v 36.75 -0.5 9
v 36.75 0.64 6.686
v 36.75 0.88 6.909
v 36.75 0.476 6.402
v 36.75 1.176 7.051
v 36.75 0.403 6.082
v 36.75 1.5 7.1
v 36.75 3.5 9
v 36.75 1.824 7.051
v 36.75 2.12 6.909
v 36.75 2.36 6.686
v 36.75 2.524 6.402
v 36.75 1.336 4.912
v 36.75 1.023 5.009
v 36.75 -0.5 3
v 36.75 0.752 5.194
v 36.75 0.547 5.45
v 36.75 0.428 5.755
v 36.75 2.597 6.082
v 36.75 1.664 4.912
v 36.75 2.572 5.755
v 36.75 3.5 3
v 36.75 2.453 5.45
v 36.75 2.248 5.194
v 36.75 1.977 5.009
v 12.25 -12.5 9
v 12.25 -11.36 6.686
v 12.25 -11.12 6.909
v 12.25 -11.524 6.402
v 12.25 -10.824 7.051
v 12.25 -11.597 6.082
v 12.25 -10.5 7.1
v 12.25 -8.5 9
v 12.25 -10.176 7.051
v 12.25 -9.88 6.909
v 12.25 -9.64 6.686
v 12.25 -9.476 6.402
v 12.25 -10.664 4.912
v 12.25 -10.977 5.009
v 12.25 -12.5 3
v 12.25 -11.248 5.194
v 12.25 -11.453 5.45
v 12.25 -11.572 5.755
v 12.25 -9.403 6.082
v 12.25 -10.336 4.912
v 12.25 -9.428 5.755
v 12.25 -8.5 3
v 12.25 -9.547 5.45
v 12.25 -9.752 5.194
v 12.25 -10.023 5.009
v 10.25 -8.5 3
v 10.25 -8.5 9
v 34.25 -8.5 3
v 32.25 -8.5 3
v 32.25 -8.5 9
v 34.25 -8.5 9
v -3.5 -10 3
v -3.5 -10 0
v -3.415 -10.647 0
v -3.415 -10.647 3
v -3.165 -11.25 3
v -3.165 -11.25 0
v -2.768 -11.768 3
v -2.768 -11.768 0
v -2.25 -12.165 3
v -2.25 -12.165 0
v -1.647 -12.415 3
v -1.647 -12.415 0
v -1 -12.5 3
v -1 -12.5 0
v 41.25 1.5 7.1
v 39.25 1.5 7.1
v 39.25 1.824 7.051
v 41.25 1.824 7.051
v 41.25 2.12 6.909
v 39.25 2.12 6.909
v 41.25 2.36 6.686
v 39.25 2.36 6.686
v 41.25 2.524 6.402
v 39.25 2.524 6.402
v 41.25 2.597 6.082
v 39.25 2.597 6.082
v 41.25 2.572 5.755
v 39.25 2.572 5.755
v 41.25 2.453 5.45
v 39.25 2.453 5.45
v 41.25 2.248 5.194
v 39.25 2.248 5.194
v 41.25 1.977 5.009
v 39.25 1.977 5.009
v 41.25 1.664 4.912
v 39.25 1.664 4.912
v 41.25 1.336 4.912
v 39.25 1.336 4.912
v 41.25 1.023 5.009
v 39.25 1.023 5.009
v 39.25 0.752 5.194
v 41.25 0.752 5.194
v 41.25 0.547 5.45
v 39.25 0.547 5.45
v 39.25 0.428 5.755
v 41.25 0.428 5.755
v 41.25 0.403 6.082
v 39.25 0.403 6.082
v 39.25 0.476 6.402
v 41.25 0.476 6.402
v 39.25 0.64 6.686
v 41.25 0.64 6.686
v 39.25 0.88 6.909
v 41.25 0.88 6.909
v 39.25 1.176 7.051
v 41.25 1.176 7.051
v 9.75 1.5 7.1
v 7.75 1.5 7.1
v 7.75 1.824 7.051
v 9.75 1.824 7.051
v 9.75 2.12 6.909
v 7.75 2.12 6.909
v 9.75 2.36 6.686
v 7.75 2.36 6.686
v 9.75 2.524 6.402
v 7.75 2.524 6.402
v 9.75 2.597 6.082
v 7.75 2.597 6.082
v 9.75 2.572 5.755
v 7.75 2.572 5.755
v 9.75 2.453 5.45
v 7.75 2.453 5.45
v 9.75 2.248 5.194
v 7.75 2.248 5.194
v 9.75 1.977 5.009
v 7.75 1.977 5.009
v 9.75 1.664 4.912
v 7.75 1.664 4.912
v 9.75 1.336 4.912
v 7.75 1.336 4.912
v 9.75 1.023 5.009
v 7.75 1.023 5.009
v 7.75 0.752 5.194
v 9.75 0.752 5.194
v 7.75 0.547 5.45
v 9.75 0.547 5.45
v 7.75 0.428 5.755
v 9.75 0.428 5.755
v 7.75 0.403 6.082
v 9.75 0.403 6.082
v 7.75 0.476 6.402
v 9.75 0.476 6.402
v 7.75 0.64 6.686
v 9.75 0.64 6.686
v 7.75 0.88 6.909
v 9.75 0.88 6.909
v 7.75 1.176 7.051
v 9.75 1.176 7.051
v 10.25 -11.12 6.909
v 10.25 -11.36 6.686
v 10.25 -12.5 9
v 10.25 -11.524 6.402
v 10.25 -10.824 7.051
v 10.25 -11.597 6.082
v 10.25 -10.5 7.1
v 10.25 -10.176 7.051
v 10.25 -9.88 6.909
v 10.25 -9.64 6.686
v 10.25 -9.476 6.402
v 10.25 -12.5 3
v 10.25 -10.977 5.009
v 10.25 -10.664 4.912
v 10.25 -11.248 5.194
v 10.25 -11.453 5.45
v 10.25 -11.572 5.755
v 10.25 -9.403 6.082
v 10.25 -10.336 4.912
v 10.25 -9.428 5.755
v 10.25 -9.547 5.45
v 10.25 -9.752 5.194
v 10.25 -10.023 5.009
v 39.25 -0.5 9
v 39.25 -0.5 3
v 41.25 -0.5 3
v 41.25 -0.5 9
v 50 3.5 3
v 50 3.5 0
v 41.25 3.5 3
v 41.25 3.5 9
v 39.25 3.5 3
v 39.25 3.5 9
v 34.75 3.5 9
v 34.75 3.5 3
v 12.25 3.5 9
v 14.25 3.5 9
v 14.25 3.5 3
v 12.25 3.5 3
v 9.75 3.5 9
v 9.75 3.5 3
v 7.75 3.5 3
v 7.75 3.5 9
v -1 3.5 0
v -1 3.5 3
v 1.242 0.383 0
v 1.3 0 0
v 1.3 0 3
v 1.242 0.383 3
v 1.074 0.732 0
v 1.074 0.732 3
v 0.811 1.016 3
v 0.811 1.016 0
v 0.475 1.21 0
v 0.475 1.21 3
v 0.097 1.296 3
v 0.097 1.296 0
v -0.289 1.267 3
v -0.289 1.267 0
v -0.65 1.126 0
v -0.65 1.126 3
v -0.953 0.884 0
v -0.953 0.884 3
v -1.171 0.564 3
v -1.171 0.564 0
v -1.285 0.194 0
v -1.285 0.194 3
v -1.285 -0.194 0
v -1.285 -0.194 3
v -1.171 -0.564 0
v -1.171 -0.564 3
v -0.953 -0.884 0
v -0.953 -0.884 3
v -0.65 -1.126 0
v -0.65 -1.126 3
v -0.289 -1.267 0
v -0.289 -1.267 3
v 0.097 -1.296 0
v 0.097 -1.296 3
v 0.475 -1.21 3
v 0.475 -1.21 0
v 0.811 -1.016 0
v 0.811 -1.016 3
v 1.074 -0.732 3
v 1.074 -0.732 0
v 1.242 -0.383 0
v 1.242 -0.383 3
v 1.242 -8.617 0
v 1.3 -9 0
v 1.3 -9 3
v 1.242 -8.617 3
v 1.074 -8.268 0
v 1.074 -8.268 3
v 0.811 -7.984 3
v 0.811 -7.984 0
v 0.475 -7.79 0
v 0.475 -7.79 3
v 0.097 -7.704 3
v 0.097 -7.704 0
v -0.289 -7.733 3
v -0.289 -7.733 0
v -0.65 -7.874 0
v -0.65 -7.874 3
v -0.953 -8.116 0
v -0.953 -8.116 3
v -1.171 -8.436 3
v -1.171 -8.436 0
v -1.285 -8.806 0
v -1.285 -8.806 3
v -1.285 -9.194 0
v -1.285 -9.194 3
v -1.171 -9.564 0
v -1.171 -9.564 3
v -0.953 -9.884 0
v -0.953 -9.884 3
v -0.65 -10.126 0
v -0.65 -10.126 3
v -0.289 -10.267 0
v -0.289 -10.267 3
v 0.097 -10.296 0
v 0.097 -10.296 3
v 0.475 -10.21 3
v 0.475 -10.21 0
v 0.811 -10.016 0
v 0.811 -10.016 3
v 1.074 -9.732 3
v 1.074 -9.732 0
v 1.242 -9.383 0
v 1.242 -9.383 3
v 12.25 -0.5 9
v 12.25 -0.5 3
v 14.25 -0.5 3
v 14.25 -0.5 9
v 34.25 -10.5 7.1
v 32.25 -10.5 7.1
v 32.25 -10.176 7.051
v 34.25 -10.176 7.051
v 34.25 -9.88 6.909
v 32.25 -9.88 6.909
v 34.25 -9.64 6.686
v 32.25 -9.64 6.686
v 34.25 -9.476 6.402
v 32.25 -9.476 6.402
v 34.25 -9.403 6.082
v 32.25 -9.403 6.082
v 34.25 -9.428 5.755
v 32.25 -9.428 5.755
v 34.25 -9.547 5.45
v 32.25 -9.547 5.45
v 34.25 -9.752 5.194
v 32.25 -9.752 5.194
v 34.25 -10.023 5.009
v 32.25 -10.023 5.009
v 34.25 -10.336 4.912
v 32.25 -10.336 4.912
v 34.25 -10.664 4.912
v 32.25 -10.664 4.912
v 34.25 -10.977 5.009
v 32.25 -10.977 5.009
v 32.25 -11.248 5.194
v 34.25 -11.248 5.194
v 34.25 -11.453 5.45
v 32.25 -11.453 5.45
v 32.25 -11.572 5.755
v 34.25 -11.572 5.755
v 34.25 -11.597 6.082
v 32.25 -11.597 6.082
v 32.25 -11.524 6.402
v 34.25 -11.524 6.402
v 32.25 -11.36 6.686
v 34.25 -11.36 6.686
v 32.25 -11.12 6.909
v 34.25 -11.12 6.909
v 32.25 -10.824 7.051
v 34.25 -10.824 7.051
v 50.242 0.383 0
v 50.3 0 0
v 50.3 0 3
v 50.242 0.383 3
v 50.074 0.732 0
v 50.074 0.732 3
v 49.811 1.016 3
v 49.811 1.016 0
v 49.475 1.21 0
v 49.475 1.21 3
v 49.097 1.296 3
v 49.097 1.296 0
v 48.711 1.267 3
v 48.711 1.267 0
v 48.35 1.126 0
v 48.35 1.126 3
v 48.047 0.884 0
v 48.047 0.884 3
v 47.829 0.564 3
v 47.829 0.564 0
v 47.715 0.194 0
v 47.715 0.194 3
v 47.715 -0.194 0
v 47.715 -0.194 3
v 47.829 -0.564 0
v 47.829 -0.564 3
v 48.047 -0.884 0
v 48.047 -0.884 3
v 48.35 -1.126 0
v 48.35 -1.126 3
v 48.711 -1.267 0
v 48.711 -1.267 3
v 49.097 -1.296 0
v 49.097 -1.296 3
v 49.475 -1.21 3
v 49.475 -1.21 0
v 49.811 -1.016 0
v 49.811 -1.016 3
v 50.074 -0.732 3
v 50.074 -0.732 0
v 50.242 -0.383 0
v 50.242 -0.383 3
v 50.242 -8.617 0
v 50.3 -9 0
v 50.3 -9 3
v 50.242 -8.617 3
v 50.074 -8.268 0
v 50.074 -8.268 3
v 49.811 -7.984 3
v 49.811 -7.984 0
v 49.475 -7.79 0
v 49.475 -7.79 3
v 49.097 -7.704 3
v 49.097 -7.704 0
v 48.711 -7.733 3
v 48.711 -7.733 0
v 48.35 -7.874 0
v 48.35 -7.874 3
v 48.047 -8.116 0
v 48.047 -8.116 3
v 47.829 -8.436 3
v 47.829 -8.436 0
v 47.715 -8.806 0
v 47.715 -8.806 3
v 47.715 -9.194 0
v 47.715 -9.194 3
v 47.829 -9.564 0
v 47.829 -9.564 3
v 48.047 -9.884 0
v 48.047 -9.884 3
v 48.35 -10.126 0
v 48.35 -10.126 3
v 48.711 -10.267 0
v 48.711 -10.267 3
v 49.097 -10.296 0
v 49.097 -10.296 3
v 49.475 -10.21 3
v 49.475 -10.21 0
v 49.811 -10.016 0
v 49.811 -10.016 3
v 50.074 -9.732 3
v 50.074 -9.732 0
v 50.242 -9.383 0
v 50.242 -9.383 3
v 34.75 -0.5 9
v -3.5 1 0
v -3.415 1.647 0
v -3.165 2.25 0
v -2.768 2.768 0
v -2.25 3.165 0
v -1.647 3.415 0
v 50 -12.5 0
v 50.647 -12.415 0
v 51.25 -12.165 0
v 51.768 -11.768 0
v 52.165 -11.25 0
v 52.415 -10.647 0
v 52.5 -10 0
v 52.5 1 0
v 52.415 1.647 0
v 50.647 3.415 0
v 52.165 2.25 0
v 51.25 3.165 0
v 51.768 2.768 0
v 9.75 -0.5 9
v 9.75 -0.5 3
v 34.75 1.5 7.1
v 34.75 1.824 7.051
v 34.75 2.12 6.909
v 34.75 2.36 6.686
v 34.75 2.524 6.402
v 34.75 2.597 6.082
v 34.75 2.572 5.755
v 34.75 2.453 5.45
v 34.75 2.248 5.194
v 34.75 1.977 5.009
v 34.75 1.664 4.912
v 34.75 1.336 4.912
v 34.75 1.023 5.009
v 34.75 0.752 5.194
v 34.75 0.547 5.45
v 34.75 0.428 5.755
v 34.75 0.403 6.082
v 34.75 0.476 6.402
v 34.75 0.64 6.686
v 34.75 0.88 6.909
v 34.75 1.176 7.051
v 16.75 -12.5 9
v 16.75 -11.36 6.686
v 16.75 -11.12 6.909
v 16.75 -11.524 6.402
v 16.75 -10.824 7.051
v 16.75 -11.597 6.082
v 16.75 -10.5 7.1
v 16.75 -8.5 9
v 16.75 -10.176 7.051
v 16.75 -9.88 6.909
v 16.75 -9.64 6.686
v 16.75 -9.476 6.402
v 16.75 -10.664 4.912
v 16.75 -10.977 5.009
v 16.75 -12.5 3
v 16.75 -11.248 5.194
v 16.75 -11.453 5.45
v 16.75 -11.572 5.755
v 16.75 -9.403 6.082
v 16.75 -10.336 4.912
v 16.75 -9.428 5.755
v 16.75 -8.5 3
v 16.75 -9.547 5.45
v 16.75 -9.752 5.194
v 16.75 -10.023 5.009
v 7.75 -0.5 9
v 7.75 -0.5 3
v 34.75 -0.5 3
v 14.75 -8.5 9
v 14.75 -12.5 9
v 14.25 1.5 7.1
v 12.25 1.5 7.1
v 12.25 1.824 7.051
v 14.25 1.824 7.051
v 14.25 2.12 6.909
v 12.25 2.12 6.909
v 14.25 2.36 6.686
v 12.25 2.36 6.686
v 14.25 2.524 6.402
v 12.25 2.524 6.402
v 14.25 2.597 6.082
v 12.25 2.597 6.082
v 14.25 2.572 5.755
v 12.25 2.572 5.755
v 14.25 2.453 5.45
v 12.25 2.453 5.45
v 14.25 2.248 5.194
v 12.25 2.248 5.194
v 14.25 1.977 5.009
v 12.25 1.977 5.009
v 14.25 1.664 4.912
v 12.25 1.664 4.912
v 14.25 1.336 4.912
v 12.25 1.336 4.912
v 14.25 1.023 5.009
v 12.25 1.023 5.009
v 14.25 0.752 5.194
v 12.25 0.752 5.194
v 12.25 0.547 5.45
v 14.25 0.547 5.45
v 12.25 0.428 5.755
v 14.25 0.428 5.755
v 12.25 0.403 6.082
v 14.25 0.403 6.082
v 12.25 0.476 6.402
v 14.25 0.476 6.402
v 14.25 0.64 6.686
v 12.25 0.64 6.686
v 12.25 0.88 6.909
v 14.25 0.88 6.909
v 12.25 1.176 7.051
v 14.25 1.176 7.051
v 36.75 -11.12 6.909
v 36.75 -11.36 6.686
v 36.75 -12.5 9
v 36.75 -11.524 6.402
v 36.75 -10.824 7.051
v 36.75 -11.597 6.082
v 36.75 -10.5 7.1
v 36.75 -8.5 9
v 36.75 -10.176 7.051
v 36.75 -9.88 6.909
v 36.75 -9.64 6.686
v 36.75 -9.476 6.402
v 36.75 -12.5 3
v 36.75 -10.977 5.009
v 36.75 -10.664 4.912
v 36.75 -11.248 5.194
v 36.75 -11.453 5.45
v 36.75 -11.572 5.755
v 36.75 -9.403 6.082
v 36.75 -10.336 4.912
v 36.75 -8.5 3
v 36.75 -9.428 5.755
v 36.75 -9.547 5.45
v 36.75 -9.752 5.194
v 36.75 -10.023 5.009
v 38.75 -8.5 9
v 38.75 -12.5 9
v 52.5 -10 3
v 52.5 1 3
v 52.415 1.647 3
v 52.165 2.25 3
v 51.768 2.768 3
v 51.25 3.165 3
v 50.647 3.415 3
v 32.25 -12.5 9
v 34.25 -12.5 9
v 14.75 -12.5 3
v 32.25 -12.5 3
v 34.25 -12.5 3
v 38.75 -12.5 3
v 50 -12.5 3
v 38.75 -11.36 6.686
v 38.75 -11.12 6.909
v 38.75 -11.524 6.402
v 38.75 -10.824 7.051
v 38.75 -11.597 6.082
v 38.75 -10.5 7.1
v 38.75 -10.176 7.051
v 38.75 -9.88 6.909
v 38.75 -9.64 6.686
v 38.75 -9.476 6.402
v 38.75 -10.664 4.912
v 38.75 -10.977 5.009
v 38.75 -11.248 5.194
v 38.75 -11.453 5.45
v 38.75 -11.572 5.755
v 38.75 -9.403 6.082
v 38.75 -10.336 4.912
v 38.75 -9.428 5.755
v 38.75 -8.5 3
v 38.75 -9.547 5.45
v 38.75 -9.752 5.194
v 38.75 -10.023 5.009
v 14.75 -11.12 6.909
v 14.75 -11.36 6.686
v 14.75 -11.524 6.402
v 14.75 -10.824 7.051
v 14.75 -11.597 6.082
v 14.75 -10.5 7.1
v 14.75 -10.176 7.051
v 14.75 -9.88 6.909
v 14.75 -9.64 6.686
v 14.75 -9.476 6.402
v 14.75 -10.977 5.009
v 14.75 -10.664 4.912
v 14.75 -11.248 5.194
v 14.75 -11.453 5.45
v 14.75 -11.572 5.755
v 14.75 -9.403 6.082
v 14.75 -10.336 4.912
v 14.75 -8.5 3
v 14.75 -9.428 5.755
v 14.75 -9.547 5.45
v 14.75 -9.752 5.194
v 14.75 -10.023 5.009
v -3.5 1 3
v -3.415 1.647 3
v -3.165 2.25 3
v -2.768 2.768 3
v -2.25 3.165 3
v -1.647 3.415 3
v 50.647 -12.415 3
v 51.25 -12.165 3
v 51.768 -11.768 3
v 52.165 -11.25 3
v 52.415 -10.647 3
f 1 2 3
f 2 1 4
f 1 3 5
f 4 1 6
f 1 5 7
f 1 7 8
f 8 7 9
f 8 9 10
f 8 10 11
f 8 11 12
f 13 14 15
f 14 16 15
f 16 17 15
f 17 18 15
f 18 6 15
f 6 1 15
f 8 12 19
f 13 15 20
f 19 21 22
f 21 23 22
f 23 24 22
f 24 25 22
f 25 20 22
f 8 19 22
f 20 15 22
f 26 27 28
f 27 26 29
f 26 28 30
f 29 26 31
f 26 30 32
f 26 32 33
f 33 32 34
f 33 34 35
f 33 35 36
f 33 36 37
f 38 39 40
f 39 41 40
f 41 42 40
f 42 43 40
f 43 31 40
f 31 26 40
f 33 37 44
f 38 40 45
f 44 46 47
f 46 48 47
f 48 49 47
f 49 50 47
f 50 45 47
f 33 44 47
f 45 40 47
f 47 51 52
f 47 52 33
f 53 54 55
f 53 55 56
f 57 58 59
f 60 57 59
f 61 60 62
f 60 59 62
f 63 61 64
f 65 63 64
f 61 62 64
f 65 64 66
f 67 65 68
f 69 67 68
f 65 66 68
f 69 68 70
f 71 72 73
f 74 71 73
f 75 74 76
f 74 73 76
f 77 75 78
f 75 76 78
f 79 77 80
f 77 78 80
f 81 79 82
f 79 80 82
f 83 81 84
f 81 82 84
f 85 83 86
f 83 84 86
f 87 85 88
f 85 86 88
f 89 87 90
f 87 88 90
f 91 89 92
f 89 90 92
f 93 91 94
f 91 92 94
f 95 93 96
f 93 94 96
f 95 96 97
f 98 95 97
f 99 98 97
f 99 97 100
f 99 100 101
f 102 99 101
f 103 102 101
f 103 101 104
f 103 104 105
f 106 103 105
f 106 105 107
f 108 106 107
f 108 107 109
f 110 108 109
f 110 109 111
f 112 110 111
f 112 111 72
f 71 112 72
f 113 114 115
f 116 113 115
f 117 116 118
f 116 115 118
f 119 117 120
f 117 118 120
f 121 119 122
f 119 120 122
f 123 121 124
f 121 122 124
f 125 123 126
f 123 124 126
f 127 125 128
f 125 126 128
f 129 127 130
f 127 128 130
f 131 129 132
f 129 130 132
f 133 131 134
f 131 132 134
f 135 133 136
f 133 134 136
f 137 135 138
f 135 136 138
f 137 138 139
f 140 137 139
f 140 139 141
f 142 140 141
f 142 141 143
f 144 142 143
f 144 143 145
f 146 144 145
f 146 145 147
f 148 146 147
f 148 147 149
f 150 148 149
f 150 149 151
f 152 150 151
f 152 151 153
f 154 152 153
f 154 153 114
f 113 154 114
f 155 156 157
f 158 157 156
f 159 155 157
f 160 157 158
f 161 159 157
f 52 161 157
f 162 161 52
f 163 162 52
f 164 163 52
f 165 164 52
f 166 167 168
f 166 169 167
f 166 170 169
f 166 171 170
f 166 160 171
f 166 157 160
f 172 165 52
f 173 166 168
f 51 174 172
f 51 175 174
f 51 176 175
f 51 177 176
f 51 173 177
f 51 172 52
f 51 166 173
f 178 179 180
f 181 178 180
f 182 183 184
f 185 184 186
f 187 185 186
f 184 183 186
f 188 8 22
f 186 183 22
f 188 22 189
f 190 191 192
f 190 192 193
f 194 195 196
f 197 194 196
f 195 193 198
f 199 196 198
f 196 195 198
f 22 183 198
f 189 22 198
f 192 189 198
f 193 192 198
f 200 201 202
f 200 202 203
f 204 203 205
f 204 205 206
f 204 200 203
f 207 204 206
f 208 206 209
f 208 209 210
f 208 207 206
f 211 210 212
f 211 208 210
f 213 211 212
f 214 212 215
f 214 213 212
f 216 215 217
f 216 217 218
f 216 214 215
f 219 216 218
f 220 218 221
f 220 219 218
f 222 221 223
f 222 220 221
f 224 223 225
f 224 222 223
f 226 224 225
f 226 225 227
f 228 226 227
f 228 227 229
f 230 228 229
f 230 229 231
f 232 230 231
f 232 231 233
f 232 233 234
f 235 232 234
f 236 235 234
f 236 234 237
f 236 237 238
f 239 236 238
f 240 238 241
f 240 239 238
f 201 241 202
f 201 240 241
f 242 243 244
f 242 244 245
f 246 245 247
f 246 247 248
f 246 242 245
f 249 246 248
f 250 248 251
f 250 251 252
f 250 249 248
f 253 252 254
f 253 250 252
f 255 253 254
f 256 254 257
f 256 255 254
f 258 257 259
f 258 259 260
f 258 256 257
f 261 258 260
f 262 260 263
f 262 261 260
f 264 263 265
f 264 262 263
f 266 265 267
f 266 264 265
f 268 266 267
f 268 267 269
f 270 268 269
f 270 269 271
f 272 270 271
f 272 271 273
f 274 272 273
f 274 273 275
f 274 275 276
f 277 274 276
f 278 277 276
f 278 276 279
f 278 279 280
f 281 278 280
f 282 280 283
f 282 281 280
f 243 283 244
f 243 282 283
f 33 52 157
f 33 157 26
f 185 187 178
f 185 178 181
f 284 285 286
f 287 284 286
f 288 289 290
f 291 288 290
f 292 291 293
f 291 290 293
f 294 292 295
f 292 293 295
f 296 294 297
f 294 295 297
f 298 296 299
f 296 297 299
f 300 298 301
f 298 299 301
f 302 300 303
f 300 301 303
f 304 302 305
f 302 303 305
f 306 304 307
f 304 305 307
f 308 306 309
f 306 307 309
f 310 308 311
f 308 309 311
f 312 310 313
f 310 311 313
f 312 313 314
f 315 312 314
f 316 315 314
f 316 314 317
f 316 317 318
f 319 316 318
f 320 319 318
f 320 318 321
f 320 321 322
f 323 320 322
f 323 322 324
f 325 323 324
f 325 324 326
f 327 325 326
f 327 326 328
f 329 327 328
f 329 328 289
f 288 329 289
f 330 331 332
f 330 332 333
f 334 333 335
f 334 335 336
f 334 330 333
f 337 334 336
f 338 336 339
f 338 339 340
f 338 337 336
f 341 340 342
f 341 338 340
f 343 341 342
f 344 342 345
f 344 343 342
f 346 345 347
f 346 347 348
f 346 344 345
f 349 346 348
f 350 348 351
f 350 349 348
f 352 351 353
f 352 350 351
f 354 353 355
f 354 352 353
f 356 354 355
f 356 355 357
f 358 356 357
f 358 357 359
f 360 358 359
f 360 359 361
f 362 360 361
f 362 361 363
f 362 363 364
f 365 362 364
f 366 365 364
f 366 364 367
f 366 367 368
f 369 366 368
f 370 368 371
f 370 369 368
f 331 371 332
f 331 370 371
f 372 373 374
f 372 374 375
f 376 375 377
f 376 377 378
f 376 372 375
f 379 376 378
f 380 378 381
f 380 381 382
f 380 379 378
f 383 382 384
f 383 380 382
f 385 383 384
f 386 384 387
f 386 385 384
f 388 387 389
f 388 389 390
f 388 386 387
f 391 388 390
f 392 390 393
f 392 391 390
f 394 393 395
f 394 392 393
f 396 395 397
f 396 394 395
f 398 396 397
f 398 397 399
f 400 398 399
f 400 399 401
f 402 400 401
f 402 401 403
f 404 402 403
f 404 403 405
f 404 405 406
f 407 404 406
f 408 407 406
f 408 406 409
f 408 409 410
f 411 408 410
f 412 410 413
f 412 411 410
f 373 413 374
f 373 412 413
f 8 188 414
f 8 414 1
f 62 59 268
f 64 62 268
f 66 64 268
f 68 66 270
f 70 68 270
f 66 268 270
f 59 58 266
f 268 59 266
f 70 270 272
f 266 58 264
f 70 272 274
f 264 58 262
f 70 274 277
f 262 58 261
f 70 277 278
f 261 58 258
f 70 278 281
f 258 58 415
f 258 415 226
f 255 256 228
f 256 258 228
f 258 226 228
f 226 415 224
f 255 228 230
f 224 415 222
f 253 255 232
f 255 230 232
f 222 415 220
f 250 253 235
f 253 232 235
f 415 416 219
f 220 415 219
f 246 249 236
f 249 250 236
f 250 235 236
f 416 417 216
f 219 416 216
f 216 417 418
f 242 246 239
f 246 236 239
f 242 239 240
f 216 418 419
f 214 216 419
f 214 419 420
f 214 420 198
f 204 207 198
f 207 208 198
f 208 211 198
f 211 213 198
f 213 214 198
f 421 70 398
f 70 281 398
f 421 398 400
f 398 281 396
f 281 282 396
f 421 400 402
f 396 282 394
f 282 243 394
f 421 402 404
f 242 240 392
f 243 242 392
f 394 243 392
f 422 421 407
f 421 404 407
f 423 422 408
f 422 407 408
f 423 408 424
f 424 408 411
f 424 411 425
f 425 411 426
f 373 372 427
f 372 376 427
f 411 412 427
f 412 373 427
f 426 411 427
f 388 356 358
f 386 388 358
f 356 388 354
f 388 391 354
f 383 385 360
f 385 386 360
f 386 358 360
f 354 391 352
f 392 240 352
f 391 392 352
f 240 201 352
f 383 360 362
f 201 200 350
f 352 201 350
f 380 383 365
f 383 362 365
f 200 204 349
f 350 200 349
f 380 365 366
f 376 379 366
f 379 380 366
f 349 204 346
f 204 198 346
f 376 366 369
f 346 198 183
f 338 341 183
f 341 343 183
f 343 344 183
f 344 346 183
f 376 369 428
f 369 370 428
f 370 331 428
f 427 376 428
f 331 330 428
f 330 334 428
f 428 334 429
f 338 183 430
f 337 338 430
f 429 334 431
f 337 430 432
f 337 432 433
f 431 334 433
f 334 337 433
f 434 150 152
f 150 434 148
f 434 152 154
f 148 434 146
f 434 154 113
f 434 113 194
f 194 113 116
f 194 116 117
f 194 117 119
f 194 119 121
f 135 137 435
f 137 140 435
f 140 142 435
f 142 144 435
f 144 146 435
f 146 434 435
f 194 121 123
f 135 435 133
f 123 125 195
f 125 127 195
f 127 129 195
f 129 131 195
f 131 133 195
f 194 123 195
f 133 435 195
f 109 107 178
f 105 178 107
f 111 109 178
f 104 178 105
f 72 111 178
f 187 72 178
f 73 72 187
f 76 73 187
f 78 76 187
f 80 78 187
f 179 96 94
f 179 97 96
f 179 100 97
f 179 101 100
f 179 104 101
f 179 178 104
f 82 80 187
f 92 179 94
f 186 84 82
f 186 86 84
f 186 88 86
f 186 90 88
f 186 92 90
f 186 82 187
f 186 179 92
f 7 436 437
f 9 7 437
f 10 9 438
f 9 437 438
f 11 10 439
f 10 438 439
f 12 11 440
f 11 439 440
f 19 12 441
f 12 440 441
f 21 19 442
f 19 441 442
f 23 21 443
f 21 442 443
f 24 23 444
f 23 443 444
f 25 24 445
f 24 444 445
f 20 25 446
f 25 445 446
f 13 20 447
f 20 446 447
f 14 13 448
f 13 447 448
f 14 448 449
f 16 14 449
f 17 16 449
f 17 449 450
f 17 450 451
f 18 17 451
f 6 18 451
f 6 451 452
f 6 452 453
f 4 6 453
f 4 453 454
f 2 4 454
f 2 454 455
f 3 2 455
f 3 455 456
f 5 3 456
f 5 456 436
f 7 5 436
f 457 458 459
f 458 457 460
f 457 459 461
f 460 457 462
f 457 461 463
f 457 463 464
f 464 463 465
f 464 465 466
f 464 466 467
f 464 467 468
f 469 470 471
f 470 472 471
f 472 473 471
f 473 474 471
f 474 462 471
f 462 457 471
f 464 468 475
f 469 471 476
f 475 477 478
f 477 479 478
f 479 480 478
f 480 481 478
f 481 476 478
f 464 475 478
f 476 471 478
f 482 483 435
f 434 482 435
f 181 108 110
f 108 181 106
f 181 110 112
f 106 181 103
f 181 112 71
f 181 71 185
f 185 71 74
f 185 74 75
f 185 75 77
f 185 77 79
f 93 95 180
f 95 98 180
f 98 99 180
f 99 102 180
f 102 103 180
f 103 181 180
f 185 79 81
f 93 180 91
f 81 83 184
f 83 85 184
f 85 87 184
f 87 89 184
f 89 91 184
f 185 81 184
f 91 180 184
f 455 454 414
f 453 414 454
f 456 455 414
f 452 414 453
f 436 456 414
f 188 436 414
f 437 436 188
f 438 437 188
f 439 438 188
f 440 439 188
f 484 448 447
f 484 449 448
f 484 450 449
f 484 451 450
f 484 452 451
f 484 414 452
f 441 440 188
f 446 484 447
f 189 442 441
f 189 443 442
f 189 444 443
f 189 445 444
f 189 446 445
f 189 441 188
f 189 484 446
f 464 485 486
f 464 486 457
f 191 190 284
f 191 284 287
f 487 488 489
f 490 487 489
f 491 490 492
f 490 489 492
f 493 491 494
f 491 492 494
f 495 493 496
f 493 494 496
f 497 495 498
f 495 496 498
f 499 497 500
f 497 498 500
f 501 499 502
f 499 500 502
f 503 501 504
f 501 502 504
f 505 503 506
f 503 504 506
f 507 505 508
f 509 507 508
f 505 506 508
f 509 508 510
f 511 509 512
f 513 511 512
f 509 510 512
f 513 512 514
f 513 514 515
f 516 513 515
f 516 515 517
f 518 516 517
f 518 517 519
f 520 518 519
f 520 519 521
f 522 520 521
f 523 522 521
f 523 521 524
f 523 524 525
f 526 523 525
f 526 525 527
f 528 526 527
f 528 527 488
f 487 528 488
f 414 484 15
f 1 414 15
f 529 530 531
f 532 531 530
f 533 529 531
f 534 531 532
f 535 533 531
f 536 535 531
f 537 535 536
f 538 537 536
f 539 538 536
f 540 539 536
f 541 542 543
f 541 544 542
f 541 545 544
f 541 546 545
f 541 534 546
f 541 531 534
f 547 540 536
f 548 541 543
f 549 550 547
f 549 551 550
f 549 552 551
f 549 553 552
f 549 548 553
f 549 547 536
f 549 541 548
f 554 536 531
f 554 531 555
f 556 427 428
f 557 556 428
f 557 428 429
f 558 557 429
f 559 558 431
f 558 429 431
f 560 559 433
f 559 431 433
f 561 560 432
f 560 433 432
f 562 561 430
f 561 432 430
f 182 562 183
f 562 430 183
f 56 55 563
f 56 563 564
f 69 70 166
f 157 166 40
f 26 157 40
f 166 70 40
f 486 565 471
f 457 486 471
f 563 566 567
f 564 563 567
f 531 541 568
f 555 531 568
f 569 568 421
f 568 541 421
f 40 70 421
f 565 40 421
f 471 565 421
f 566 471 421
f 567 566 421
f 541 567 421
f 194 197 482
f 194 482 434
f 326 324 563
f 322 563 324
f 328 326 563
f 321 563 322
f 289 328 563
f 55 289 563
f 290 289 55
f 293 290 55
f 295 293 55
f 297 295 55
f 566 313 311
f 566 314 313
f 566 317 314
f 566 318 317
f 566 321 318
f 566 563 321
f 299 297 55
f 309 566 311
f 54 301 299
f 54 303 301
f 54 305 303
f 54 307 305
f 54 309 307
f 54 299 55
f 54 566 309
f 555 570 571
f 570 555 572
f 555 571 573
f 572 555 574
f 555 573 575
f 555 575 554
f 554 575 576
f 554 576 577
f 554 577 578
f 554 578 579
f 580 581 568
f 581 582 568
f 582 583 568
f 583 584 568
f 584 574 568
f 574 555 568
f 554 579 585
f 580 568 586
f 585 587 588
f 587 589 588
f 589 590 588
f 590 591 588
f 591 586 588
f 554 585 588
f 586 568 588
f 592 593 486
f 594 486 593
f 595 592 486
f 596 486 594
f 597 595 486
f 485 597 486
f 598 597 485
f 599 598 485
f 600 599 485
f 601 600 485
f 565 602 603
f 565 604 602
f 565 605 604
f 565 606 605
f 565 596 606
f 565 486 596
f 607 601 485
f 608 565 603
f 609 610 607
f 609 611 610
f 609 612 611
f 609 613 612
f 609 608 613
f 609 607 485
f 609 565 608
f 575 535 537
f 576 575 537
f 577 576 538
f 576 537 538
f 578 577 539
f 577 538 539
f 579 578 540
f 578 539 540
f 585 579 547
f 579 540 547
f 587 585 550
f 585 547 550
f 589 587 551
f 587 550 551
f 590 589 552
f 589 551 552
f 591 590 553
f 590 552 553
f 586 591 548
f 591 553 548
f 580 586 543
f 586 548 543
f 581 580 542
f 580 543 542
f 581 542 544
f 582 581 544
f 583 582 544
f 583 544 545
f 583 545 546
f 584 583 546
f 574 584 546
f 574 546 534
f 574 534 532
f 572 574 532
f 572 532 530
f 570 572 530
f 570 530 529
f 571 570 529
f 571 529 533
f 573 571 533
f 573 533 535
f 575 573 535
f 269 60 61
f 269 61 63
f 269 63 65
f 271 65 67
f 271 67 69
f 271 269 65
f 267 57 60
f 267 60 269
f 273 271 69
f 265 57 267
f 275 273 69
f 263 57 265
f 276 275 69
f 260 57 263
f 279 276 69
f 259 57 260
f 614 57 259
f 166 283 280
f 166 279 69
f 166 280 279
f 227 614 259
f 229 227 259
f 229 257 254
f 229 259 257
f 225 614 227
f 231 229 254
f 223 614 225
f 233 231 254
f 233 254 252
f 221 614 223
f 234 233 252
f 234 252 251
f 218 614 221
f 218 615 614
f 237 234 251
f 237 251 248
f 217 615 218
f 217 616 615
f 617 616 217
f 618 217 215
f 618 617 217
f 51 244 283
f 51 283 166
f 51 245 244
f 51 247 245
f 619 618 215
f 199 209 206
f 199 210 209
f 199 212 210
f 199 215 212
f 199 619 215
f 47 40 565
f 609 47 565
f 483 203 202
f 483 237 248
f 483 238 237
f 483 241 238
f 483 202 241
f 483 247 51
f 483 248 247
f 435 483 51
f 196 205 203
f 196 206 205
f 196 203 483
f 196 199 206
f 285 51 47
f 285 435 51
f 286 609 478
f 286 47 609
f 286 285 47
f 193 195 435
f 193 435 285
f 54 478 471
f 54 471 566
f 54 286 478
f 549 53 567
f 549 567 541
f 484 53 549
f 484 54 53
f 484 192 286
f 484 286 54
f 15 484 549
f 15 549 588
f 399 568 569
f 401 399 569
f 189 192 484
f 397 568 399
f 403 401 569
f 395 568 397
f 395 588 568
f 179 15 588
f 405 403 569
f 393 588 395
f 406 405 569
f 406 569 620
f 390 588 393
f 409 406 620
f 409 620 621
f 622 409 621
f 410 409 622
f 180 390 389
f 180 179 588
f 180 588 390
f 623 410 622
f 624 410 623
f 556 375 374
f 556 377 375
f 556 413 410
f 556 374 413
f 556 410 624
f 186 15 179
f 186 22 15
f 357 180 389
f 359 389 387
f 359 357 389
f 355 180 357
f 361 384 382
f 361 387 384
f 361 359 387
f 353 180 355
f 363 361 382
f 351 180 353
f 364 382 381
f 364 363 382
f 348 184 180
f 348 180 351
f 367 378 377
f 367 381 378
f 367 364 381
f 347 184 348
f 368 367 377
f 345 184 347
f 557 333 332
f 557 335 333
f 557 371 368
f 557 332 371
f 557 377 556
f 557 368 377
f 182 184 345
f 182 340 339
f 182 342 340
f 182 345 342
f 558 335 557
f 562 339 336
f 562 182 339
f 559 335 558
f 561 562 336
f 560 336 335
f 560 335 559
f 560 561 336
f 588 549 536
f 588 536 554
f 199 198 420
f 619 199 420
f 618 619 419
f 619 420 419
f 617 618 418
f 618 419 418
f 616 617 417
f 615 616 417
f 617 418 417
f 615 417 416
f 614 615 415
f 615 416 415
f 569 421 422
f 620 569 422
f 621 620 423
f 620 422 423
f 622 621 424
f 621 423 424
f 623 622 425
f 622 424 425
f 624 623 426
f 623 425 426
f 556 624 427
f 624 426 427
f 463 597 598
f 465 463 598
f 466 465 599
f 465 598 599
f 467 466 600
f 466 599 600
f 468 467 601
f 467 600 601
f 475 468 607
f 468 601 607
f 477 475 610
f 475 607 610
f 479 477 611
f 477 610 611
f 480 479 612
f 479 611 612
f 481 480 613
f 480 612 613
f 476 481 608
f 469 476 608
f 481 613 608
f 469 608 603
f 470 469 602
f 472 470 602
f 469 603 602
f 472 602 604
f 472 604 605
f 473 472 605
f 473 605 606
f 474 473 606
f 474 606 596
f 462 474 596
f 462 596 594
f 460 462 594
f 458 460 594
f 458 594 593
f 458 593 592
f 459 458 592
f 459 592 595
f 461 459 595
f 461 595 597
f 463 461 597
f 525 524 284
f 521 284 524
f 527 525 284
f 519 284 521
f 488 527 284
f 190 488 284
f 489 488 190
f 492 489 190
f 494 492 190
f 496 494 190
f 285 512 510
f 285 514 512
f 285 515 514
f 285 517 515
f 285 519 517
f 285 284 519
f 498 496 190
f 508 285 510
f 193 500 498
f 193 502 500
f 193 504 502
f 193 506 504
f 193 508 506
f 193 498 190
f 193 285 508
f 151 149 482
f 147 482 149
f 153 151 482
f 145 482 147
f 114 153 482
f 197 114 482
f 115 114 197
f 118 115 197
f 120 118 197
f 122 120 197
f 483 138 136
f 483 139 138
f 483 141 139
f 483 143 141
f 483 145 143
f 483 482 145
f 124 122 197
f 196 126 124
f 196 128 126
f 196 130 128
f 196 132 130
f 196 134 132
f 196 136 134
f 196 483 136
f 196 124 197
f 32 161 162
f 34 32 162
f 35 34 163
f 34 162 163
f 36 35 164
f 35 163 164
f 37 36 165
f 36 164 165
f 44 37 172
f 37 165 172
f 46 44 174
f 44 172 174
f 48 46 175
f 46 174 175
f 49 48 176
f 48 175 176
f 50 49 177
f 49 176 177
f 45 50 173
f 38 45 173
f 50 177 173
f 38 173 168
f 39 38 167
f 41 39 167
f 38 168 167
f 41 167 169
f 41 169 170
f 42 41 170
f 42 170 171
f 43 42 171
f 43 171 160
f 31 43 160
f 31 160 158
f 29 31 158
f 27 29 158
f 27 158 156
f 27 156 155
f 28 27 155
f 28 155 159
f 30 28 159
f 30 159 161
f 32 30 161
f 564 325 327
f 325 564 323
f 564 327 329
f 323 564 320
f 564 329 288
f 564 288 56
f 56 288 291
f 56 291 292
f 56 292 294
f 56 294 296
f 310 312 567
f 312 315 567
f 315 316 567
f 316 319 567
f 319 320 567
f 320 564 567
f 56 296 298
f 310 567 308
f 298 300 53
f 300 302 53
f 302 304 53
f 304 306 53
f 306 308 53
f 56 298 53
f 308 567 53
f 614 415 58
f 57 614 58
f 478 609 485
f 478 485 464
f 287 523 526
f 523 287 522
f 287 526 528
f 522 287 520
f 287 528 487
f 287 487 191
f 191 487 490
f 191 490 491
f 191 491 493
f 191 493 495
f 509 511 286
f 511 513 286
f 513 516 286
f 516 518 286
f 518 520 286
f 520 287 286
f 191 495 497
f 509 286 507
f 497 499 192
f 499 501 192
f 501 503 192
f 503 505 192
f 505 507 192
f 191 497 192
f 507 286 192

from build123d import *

# Parameters (mm, degrees)
SKETCH_2_R          = 1.3
EXTRUDE_2_DEPTH     = 3
SKETCH_4_W          = 2
SKETCH_4_H          = 4
EXTRUDE_3_DEPTH     = 6
SKETCH_6_R          = 1.1
CUT_EXTRUDE_2_DEPTH = 45.75


with BuildPart() as part:
    # 草图2 → 凸台-拉伸2 (new body)
    with BuildSketch(Plane.XY):
        with BuildLine():
            ThreePointArc((-3.5, -10), (-2.767766953, -11.767766953), (-1, -12.5))
            Line((-1, -12.5), (50, -12.5))
            ThreePointArc((50, -12.5), (51.767766953, -11.767766953), (52.5, -10))
            Line((52.5, -10), (52.5, 1))
            ThreePointArc((52.5, 1), (51.767766953, 2.767766953), (50, 3.5))
            Line((50, 3.5), (-1, 3.5))
            ThreePointArc((-1, 3.5), (-2.767766953, 2.767766953), (-3.5, 1))
            Line((-3.5, 1), (-3.5, -10))
        make_face()
        with Locations((0, -9)):
            Circle(SKETCH_2_R, mode=Mode.SUBTRACT)
        Circle(SKETCH_2_R, mode=Mode.SUBTRACT)
        with Locations((49, -9)):
            Circle(SKETCH_2_R, mode=Mode.SUBTRACT)
        with Locations((49, 0)):
            Circle(SKETCH_2_R, mode=Mode.SUBTRACT)
    extrude(amount=EXTRUDE_2_DEPTH)

    # 草图4 → 凸台-拉伸3 (add)
    with BuildSketch(Plane.XY.offset(3)):
        with Locations((8.75, 1.5)):
            Rectangle(SKETCH_4_W, SKETCH_4_H)
        with Locations((13.25, 1.5)):
            Rectangle(SKETCH_4_W, SKETCH_4_H)
        with Locations((35.75, 1.5)):
            Rectangle(SKETCH_4_W, SKETCH_4_H)
        with Locations((40.25, 1.5)):
            Rectangle(SKETCH_4_W, SKETCH_4_H)
        with Locations((11.25, -10.5)):
            Rectangle(SKETCH_4_W, SKETCH_4_H)
        with Locations((15.75, -10.5)):
            Rectangle(SKETCH_4_W, SKETCH_4_H)
        with Locations((33.25, -10.5)):
            Rectangle(SKETCH_4_W, SKETCH_4_H)
        with Locations((37.75, -10.5)):
            Rectangle(SKETCH_4_W, SKETCH_4_H)
    extrude(amount=EXTRUDE_3_DEPTH)

    # 草图6 → 切除-拉伸2 (cut, through all)
    with BuildSketch(Plane.ZY.offset(-7.75)):
        with Locations((6, 1.5)):
            Circle(SKETCH_6_R)
        with Locations((6, -10.5)):
            Circle(SKETCH_6_R)
    extrude(amount=-CUT_EXTRUDE_2_DEPTH, mode=Mode.SUBTRACT)


solid = part.part
